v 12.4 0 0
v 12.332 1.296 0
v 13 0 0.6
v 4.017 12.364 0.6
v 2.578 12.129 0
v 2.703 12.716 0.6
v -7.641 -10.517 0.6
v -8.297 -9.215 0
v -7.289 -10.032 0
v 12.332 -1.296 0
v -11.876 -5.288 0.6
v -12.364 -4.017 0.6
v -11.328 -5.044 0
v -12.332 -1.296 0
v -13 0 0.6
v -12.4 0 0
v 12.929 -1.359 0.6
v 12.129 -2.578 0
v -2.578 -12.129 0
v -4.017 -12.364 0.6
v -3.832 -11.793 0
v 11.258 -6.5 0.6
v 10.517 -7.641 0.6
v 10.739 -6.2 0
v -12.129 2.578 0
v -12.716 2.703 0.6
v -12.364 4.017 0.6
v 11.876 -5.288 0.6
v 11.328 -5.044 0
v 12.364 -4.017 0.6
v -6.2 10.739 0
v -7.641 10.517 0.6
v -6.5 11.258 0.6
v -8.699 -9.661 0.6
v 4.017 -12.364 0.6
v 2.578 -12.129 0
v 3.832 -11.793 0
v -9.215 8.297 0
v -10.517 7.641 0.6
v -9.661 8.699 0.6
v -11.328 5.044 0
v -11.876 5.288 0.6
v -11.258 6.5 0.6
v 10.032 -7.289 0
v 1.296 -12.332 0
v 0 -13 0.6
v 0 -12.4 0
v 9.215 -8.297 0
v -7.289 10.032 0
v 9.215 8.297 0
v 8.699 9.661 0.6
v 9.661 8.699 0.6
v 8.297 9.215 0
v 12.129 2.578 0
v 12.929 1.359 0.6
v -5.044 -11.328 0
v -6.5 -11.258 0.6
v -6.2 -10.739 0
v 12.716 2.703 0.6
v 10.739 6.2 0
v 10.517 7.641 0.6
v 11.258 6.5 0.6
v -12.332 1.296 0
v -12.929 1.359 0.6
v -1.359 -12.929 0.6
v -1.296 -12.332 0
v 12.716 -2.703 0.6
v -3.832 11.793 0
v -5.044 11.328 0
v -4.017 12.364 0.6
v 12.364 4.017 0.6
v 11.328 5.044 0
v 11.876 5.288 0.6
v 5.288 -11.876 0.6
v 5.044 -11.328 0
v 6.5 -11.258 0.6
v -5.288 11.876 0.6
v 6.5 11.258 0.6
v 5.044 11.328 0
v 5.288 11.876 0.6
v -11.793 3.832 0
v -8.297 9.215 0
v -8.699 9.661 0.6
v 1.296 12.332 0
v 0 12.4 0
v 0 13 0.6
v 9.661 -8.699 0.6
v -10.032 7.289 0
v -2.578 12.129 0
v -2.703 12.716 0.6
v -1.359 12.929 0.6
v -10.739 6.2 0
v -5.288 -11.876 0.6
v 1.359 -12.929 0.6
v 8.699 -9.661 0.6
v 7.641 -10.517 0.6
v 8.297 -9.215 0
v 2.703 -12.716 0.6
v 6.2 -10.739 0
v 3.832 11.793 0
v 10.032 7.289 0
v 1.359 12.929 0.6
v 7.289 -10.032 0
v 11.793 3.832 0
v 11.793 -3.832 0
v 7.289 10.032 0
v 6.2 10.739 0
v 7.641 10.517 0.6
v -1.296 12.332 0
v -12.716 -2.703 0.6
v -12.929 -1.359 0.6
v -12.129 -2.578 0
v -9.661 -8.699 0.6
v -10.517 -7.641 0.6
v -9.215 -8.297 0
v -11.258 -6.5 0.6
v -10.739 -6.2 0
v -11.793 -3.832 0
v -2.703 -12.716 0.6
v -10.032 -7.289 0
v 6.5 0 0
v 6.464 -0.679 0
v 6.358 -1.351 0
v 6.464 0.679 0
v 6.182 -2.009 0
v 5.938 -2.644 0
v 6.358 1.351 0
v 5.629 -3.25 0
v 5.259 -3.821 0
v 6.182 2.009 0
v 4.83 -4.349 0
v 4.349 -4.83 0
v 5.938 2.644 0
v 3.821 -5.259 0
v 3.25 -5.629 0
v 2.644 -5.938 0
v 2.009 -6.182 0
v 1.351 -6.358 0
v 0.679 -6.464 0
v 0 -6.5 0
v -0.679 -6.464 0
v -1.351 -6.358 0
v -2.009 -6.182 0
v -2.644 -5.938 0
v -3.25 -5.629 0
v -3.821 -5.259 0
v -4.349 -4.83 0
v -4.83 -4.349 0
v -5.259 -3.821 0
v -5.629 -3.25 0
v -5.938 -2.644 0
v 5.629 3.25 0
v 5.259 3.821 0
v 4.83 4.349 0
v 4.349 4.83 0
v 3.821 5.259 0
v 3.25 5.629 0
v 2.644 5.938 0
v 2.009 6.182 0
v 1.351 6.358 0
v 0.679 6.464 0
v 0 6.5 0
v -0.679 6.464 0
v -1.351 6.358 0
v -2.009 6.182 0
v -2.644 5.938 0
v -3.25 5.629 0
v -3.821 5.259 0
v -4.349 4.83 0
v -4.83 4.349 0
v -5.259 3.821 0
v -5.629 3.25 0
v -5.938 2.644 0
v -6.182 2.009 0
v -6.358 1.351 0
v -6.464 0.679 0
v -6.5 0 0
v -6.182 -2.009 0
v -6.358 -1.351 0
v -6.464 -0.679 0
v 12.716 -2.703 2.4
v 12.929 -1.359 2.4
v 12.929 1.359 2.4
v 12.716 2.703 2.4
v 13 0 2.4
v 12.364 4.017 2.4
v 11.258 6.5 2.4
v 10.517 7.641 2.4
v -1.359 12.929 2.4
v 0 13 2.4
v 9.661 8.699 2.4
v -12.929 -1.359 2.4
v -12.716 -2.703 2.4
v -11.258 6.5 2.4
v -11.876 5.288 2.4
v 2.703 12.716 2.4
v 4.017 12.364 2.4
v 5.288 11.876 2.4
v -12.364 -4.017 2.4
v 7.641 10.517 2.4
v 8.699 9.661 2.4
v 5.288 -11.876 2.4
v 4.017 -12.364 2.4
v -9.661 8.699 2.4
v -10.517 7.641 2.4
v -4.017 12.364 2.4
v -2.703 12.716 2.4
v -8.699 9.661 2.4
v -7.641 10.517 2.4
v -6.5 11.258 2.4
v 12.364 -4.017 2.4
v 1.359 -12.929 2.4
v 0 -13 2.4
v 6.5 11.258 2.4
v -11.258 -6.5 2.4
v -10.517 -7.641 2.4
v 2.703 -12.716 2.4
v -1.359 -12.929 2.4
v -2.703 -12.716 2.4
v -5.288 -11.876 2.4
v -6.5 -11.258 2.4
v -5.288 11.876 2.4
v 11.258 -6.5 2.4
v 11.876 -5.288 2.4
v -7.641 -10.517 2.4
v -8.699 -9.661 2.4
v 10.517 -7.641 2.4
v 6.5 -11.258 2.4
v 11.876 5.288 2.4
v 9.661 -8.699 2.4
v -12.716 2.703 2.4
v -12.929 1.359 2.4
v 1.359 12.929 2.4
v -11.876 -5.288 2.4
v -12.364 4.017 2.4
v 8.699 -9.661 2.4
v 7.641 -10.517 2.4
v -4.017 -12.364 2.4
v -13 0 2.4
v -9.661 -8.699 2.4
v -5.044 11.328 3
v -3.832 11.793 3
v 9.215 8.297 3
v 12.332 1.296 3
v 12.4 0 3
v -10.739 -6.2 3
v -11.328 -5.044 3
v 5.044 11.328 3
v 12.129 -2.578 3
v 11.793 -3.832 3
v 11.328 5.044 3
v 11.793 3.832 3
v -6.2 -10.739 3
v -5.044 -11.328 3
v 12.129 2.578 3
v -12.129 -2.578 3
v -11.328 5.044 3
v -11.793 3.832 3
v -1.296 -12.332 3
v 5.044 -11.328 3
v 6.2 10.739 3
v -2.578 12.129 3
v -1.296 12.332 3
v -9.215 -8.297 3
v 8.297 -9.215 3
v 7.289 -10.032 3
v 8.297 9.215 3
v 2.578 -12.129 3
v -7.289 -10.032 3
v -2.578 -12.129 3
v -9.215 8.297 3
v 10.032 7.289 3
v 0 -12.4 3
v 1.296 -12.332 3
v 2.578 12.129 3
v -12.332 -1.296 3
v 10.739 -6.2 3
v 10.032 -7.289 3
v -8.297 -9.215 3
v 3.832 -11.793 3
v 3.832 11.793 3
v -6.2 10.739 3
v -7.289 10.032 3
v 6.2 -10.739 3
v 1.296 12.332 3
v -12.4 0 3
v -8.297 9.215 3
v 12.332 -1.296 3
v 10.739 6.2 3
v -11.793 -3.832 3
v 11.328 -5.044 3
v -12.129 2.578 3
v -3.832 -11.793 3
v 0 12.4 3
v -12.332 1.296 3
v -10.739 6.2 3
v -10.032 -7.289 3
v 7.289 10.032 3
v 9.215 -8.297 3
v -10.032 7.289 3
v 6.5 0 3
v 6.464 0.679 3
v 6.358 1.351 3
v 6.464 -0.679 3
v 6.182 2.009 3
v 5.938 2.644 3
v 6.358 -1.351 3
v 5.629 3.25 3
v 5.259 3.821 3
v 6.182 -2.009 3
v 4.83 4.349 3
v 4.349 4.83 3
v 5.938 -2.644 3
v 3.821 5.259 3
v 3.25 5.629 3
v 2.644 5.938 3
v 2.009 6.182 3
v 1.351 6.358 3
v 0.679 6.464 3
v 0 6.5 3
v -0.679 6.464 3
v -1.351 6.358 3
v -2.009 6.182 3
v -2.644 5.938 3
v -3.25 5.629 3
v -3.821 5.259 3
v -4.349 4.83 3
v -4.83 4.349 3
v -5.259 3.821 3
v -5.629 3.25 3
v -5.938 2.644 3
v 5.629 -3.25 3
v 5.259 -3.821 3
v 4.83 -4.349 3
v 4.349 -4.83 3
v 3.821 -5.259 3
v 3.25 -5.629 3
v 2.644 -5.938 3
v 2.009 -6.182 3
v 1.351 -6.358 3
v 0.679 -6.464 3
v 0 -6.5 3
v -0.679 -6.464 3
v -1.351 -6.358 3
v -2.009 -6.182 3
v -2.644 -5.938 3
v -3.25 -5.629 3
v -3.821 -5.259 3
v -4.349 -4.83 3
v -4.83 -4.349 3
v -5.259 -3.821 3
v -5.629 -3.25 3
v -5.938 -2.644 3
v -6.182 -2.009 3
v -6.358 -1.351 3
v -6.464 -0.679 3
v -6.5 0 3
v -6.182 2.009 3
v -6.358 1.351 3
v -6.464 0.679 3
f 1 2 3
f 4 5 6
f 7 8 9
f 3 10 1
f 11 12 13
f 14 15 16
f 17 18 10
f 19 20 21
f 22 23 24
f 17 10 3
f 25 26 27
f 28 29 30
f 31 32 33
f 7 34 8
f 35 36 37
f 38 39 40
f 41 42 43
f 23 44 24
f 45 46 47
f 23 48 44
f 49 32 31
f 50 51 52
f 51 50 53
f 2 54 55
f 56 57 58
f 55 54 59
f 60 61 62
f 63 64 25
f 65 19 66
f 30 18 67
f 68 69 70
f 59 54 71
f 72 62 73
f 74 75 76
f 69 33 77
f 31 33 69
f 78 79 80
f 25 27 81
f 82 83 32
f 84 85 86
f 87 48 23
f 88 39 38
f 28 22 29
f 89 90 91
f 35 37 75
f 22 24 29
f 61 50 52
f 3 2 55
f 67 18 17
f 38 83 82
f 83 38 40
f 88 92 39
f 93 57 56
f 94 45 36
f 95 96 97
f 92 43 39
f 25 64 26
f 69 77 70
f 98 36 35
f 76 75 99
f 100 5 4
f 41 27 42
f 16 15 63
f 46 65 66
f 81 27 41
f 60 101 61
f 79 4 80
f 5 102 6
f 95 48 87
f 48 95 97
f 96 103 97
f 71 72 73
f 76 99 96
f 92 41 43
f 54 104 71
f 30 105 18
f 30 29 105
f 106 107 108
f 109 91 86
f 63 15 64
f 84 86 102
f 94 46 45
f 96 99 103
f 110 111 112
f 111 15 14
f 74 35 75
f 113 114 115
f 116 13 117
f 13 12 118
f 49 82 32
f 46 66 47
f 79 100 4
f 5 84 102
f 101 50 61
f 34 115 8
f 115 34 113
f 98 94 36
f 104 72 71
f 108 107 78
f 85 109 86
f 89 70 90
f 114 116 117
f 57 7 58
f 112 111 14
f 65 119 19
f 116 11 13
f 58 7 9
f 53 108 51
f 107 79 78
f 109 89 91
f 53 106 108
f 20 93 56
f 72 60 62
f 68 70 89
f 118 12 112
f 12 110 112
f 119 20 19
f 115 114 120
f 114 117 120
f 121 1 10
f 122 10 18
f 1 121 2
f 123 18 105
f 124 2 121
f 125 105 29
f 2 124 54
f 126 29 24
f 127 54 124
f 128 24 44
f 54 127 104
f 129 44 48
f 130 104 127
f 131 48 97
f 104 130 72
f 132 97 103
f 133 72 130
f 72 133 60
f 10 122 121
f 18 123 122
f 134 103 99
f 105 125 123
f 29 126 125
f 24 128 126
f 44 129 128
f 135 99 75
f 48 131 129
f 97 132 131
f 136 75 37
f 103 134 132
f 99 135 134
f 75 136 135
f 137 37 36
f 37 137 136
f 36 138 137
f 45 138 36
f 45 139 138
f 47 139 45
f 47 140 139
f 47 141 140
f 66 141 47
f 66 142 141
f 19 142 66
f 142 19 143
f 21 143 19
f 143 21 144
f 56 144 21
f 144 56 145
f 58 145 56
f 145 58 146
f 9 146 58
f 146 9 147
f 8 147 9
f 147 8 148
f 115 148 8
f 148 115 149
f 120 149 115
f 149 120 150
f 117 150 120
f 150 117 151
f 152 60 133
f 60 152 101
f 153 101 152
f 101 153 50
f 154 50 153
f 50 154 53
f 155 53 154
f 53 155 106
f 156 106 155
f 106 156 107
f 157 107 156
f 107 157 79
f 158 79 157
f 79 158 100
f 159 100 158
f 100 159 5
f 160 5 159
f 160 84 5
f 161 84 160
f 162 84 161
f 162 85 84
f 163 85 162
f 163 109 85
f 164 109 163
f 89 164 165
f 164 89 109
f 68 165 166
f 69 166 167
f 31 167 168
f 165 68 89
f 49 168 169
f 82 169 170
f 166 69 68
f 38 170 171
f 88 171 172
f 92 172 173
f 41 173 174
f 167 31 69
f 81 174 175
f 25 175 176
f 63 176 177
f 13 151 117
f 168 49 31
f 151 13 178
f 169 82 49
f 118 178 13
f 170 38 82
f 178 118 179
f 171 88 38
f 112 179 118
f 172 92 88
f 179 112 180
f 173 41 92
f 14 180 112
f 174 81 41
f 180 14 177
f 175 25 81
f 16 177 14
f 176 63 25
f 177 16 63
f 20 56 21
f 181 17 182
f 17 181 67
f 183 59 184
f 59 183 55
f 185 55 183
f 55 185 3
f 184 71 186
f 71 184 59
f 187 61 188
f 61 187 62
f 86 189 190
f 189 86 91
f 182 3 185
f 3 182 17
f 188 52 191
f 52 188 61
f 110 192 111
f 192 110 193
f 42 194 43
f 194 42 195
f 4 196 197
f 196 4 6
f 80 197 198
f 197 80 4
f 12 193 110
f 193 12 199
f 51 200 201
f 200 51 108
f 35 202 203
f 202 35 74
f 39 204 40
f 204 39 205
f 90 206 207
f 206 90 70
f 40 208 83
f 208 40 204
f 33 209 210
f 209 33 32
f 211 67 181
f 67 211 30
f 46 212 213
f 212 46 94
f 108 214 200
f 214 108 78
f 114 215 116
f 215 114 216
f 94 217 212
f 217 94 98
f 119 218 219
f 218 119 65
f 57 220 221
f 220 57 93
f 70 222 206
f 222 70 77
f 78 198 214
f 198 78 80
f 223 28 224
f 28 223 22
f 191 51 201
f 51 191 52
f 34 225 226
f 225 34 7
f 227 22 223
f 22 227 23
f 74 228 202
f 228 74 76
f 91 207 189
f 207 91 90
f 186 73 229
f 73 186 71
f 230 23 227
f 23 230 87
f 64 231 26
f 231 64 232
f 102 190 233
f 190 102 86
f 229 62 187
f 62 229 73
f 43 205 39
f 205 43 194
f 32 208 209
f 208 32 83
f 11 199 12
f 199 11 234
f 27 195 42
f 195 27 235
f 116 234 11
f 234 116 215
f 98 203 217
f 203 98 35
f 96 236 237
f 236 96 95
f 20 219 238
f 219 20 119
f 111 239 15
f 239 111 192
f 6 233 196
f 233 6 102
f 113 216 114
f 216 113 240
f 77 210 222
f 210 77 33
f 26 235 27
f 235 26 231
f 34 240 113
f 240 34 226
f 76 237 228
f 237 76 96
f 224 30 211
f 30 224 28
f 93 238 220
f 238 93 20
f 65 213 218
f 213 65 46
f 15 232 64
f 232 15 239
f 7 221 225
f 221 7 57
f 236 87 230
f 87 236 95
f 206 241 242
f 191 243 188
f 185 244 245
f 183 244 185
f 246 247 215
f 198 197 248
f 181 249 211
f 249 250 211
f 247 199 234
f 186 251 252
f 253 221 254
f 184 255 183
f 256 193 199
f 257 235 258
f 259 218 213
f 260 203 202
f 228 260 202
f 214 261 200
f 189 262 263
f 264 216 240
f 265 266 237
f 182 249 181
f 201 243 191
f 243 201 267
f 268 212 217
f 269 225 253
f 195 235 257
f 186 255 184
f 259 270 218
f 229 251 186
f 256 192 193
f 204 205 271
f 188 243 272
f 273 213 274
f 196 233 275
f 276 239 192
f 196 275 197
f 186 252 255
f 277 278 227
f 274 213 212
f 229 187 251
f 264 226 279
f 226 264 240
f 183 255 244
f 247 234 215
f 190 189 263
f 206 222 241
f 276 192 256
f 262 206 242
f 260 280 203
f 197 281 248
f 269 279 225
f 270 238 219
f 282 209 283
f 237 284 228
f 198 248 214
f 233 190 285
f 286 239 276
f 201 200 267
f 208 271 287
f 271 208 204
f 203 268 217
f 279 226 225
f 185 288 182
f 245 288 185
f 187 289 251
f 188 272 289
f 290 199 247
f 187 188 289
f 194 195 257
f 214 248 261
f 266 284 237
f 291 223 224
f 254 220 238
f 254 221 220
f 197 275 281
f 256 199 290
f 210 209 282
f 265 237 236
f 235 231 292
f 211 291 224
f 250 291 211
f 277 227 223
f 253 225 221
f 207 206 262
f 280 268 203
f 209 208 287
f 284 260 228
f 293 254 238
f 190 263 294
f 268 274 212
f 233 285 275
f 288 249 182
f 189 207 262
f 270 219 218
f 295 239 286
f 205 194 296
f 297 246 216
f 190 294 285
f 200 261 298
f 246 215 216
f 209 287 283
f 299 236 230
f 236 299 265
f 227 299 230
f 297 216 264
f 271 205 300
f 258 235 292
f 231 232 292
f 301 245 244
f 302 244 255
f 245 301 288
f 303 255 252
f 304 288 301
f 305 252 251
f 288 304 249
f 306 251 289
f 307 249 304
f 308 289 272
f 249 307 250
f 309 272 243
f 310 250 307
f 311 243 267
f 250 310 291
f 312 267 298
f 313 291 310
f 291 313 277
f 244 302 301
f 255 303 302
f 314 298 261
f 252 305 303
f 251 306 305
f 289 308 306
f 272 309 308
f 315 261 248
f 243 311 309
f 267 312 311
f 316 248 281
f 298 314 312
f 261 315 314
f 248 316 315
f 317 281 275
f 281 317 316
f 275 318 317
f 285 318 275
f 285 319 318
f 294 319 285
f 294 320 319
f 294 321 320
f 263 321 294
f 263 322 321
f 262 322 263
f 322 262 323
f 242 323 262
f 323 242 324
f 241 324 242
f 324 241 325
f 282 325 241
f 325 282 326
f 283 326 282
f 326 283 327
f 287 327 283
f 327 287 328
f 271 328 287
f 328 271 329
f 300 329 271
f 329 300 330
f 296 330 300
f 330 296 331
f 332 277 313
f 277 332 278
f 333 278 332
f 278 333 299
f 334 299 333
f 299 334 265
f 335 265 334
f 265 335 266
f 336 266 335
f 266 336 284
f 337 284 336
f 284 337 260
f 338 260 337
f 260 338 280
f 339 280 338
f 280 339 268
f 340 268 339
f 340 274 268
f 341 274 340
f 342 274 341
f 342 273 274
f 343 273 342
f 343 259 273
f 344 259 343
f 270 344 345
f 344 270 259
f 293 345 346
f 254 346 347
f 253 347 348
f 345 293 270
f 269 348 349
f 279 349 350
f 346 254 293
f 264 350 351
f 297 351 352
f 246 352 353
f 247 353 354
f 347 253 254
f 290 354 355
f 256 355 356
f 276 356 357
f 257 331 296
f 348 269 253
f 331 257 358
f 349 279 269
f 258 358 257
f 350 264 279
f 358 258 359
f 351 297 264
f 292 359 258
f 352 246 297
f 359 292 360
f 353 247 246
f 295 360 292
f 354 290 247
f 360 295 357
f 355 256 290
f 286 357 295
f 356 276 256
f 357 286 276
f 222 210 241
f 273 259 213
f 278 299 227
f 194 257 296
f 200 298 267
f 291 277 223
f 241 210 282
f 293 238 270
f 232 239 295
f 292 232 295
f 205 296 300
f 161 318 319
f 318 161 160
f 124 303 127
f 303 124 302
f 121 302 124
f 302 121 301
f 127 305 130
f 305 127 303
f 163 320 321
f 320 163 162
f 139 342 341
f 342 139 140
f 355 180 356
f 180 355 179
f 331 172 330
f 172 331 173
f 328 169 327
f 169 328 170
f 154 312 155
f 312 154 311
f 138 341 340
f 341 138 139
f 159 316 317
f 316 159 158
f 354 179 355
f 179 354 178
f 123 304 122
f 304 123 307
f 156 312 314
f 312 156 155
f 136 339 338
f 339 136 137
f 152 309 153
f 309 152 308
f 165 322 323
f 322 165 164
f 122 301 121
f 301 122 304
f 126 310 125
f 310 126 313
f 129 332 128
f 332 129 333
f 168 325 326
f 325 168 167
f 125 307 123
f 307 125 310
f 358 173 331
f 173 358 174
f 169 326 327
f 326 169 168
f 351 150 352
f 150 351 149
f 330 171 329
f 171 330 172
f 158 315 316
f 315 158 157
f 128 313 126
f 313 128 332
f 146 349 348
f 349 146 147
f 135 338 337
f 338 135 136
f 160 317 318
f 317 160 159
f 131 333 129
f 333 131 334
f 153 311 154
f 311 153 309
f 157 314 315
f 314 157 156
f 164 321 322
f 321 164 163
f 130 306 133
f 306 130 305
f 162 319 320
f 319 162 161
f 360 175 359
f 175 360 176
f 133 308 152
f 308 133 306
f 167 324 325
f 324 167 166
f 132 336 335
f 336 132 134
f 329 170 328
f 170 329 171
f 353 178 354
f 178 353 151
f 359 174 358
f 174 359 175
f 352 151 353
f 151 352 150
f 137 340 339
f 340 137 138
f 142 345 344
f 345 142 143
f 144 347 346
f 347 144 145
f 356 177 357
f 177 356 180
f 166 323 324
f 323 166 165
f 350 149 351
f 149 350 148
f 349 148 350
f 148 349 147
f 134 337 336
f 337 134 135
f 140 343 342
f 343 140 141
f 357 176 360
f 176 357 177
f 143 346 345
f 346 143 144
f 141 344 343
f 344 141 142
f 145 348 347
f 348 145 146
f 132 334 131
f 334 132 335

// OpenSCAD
// Chamfered metric washer.
$fn = 60;
eps = 0.02;
inner_d = 13;
outer_d = 26;
thickness = 3;
chamfer = 0.6;
difference() {
    union() {
        cylinder(d1 = outer_d - 2 * chamfer, d2 = outer_d, h = chamfer);
        translate([0, 0, chamfer]) cylinder(d = outer_d, h = thickness - 2 * chamfer);
        translate([0, 0, thickness - chamfer]) cylinder(d1 = outer_d, d2 = outer_d - 2 * chamfer, h = chamfer);
    }
    translate([0, 0, -eps]) cylinder(d = inner_d, h = thickness + 2 * eps);
}
